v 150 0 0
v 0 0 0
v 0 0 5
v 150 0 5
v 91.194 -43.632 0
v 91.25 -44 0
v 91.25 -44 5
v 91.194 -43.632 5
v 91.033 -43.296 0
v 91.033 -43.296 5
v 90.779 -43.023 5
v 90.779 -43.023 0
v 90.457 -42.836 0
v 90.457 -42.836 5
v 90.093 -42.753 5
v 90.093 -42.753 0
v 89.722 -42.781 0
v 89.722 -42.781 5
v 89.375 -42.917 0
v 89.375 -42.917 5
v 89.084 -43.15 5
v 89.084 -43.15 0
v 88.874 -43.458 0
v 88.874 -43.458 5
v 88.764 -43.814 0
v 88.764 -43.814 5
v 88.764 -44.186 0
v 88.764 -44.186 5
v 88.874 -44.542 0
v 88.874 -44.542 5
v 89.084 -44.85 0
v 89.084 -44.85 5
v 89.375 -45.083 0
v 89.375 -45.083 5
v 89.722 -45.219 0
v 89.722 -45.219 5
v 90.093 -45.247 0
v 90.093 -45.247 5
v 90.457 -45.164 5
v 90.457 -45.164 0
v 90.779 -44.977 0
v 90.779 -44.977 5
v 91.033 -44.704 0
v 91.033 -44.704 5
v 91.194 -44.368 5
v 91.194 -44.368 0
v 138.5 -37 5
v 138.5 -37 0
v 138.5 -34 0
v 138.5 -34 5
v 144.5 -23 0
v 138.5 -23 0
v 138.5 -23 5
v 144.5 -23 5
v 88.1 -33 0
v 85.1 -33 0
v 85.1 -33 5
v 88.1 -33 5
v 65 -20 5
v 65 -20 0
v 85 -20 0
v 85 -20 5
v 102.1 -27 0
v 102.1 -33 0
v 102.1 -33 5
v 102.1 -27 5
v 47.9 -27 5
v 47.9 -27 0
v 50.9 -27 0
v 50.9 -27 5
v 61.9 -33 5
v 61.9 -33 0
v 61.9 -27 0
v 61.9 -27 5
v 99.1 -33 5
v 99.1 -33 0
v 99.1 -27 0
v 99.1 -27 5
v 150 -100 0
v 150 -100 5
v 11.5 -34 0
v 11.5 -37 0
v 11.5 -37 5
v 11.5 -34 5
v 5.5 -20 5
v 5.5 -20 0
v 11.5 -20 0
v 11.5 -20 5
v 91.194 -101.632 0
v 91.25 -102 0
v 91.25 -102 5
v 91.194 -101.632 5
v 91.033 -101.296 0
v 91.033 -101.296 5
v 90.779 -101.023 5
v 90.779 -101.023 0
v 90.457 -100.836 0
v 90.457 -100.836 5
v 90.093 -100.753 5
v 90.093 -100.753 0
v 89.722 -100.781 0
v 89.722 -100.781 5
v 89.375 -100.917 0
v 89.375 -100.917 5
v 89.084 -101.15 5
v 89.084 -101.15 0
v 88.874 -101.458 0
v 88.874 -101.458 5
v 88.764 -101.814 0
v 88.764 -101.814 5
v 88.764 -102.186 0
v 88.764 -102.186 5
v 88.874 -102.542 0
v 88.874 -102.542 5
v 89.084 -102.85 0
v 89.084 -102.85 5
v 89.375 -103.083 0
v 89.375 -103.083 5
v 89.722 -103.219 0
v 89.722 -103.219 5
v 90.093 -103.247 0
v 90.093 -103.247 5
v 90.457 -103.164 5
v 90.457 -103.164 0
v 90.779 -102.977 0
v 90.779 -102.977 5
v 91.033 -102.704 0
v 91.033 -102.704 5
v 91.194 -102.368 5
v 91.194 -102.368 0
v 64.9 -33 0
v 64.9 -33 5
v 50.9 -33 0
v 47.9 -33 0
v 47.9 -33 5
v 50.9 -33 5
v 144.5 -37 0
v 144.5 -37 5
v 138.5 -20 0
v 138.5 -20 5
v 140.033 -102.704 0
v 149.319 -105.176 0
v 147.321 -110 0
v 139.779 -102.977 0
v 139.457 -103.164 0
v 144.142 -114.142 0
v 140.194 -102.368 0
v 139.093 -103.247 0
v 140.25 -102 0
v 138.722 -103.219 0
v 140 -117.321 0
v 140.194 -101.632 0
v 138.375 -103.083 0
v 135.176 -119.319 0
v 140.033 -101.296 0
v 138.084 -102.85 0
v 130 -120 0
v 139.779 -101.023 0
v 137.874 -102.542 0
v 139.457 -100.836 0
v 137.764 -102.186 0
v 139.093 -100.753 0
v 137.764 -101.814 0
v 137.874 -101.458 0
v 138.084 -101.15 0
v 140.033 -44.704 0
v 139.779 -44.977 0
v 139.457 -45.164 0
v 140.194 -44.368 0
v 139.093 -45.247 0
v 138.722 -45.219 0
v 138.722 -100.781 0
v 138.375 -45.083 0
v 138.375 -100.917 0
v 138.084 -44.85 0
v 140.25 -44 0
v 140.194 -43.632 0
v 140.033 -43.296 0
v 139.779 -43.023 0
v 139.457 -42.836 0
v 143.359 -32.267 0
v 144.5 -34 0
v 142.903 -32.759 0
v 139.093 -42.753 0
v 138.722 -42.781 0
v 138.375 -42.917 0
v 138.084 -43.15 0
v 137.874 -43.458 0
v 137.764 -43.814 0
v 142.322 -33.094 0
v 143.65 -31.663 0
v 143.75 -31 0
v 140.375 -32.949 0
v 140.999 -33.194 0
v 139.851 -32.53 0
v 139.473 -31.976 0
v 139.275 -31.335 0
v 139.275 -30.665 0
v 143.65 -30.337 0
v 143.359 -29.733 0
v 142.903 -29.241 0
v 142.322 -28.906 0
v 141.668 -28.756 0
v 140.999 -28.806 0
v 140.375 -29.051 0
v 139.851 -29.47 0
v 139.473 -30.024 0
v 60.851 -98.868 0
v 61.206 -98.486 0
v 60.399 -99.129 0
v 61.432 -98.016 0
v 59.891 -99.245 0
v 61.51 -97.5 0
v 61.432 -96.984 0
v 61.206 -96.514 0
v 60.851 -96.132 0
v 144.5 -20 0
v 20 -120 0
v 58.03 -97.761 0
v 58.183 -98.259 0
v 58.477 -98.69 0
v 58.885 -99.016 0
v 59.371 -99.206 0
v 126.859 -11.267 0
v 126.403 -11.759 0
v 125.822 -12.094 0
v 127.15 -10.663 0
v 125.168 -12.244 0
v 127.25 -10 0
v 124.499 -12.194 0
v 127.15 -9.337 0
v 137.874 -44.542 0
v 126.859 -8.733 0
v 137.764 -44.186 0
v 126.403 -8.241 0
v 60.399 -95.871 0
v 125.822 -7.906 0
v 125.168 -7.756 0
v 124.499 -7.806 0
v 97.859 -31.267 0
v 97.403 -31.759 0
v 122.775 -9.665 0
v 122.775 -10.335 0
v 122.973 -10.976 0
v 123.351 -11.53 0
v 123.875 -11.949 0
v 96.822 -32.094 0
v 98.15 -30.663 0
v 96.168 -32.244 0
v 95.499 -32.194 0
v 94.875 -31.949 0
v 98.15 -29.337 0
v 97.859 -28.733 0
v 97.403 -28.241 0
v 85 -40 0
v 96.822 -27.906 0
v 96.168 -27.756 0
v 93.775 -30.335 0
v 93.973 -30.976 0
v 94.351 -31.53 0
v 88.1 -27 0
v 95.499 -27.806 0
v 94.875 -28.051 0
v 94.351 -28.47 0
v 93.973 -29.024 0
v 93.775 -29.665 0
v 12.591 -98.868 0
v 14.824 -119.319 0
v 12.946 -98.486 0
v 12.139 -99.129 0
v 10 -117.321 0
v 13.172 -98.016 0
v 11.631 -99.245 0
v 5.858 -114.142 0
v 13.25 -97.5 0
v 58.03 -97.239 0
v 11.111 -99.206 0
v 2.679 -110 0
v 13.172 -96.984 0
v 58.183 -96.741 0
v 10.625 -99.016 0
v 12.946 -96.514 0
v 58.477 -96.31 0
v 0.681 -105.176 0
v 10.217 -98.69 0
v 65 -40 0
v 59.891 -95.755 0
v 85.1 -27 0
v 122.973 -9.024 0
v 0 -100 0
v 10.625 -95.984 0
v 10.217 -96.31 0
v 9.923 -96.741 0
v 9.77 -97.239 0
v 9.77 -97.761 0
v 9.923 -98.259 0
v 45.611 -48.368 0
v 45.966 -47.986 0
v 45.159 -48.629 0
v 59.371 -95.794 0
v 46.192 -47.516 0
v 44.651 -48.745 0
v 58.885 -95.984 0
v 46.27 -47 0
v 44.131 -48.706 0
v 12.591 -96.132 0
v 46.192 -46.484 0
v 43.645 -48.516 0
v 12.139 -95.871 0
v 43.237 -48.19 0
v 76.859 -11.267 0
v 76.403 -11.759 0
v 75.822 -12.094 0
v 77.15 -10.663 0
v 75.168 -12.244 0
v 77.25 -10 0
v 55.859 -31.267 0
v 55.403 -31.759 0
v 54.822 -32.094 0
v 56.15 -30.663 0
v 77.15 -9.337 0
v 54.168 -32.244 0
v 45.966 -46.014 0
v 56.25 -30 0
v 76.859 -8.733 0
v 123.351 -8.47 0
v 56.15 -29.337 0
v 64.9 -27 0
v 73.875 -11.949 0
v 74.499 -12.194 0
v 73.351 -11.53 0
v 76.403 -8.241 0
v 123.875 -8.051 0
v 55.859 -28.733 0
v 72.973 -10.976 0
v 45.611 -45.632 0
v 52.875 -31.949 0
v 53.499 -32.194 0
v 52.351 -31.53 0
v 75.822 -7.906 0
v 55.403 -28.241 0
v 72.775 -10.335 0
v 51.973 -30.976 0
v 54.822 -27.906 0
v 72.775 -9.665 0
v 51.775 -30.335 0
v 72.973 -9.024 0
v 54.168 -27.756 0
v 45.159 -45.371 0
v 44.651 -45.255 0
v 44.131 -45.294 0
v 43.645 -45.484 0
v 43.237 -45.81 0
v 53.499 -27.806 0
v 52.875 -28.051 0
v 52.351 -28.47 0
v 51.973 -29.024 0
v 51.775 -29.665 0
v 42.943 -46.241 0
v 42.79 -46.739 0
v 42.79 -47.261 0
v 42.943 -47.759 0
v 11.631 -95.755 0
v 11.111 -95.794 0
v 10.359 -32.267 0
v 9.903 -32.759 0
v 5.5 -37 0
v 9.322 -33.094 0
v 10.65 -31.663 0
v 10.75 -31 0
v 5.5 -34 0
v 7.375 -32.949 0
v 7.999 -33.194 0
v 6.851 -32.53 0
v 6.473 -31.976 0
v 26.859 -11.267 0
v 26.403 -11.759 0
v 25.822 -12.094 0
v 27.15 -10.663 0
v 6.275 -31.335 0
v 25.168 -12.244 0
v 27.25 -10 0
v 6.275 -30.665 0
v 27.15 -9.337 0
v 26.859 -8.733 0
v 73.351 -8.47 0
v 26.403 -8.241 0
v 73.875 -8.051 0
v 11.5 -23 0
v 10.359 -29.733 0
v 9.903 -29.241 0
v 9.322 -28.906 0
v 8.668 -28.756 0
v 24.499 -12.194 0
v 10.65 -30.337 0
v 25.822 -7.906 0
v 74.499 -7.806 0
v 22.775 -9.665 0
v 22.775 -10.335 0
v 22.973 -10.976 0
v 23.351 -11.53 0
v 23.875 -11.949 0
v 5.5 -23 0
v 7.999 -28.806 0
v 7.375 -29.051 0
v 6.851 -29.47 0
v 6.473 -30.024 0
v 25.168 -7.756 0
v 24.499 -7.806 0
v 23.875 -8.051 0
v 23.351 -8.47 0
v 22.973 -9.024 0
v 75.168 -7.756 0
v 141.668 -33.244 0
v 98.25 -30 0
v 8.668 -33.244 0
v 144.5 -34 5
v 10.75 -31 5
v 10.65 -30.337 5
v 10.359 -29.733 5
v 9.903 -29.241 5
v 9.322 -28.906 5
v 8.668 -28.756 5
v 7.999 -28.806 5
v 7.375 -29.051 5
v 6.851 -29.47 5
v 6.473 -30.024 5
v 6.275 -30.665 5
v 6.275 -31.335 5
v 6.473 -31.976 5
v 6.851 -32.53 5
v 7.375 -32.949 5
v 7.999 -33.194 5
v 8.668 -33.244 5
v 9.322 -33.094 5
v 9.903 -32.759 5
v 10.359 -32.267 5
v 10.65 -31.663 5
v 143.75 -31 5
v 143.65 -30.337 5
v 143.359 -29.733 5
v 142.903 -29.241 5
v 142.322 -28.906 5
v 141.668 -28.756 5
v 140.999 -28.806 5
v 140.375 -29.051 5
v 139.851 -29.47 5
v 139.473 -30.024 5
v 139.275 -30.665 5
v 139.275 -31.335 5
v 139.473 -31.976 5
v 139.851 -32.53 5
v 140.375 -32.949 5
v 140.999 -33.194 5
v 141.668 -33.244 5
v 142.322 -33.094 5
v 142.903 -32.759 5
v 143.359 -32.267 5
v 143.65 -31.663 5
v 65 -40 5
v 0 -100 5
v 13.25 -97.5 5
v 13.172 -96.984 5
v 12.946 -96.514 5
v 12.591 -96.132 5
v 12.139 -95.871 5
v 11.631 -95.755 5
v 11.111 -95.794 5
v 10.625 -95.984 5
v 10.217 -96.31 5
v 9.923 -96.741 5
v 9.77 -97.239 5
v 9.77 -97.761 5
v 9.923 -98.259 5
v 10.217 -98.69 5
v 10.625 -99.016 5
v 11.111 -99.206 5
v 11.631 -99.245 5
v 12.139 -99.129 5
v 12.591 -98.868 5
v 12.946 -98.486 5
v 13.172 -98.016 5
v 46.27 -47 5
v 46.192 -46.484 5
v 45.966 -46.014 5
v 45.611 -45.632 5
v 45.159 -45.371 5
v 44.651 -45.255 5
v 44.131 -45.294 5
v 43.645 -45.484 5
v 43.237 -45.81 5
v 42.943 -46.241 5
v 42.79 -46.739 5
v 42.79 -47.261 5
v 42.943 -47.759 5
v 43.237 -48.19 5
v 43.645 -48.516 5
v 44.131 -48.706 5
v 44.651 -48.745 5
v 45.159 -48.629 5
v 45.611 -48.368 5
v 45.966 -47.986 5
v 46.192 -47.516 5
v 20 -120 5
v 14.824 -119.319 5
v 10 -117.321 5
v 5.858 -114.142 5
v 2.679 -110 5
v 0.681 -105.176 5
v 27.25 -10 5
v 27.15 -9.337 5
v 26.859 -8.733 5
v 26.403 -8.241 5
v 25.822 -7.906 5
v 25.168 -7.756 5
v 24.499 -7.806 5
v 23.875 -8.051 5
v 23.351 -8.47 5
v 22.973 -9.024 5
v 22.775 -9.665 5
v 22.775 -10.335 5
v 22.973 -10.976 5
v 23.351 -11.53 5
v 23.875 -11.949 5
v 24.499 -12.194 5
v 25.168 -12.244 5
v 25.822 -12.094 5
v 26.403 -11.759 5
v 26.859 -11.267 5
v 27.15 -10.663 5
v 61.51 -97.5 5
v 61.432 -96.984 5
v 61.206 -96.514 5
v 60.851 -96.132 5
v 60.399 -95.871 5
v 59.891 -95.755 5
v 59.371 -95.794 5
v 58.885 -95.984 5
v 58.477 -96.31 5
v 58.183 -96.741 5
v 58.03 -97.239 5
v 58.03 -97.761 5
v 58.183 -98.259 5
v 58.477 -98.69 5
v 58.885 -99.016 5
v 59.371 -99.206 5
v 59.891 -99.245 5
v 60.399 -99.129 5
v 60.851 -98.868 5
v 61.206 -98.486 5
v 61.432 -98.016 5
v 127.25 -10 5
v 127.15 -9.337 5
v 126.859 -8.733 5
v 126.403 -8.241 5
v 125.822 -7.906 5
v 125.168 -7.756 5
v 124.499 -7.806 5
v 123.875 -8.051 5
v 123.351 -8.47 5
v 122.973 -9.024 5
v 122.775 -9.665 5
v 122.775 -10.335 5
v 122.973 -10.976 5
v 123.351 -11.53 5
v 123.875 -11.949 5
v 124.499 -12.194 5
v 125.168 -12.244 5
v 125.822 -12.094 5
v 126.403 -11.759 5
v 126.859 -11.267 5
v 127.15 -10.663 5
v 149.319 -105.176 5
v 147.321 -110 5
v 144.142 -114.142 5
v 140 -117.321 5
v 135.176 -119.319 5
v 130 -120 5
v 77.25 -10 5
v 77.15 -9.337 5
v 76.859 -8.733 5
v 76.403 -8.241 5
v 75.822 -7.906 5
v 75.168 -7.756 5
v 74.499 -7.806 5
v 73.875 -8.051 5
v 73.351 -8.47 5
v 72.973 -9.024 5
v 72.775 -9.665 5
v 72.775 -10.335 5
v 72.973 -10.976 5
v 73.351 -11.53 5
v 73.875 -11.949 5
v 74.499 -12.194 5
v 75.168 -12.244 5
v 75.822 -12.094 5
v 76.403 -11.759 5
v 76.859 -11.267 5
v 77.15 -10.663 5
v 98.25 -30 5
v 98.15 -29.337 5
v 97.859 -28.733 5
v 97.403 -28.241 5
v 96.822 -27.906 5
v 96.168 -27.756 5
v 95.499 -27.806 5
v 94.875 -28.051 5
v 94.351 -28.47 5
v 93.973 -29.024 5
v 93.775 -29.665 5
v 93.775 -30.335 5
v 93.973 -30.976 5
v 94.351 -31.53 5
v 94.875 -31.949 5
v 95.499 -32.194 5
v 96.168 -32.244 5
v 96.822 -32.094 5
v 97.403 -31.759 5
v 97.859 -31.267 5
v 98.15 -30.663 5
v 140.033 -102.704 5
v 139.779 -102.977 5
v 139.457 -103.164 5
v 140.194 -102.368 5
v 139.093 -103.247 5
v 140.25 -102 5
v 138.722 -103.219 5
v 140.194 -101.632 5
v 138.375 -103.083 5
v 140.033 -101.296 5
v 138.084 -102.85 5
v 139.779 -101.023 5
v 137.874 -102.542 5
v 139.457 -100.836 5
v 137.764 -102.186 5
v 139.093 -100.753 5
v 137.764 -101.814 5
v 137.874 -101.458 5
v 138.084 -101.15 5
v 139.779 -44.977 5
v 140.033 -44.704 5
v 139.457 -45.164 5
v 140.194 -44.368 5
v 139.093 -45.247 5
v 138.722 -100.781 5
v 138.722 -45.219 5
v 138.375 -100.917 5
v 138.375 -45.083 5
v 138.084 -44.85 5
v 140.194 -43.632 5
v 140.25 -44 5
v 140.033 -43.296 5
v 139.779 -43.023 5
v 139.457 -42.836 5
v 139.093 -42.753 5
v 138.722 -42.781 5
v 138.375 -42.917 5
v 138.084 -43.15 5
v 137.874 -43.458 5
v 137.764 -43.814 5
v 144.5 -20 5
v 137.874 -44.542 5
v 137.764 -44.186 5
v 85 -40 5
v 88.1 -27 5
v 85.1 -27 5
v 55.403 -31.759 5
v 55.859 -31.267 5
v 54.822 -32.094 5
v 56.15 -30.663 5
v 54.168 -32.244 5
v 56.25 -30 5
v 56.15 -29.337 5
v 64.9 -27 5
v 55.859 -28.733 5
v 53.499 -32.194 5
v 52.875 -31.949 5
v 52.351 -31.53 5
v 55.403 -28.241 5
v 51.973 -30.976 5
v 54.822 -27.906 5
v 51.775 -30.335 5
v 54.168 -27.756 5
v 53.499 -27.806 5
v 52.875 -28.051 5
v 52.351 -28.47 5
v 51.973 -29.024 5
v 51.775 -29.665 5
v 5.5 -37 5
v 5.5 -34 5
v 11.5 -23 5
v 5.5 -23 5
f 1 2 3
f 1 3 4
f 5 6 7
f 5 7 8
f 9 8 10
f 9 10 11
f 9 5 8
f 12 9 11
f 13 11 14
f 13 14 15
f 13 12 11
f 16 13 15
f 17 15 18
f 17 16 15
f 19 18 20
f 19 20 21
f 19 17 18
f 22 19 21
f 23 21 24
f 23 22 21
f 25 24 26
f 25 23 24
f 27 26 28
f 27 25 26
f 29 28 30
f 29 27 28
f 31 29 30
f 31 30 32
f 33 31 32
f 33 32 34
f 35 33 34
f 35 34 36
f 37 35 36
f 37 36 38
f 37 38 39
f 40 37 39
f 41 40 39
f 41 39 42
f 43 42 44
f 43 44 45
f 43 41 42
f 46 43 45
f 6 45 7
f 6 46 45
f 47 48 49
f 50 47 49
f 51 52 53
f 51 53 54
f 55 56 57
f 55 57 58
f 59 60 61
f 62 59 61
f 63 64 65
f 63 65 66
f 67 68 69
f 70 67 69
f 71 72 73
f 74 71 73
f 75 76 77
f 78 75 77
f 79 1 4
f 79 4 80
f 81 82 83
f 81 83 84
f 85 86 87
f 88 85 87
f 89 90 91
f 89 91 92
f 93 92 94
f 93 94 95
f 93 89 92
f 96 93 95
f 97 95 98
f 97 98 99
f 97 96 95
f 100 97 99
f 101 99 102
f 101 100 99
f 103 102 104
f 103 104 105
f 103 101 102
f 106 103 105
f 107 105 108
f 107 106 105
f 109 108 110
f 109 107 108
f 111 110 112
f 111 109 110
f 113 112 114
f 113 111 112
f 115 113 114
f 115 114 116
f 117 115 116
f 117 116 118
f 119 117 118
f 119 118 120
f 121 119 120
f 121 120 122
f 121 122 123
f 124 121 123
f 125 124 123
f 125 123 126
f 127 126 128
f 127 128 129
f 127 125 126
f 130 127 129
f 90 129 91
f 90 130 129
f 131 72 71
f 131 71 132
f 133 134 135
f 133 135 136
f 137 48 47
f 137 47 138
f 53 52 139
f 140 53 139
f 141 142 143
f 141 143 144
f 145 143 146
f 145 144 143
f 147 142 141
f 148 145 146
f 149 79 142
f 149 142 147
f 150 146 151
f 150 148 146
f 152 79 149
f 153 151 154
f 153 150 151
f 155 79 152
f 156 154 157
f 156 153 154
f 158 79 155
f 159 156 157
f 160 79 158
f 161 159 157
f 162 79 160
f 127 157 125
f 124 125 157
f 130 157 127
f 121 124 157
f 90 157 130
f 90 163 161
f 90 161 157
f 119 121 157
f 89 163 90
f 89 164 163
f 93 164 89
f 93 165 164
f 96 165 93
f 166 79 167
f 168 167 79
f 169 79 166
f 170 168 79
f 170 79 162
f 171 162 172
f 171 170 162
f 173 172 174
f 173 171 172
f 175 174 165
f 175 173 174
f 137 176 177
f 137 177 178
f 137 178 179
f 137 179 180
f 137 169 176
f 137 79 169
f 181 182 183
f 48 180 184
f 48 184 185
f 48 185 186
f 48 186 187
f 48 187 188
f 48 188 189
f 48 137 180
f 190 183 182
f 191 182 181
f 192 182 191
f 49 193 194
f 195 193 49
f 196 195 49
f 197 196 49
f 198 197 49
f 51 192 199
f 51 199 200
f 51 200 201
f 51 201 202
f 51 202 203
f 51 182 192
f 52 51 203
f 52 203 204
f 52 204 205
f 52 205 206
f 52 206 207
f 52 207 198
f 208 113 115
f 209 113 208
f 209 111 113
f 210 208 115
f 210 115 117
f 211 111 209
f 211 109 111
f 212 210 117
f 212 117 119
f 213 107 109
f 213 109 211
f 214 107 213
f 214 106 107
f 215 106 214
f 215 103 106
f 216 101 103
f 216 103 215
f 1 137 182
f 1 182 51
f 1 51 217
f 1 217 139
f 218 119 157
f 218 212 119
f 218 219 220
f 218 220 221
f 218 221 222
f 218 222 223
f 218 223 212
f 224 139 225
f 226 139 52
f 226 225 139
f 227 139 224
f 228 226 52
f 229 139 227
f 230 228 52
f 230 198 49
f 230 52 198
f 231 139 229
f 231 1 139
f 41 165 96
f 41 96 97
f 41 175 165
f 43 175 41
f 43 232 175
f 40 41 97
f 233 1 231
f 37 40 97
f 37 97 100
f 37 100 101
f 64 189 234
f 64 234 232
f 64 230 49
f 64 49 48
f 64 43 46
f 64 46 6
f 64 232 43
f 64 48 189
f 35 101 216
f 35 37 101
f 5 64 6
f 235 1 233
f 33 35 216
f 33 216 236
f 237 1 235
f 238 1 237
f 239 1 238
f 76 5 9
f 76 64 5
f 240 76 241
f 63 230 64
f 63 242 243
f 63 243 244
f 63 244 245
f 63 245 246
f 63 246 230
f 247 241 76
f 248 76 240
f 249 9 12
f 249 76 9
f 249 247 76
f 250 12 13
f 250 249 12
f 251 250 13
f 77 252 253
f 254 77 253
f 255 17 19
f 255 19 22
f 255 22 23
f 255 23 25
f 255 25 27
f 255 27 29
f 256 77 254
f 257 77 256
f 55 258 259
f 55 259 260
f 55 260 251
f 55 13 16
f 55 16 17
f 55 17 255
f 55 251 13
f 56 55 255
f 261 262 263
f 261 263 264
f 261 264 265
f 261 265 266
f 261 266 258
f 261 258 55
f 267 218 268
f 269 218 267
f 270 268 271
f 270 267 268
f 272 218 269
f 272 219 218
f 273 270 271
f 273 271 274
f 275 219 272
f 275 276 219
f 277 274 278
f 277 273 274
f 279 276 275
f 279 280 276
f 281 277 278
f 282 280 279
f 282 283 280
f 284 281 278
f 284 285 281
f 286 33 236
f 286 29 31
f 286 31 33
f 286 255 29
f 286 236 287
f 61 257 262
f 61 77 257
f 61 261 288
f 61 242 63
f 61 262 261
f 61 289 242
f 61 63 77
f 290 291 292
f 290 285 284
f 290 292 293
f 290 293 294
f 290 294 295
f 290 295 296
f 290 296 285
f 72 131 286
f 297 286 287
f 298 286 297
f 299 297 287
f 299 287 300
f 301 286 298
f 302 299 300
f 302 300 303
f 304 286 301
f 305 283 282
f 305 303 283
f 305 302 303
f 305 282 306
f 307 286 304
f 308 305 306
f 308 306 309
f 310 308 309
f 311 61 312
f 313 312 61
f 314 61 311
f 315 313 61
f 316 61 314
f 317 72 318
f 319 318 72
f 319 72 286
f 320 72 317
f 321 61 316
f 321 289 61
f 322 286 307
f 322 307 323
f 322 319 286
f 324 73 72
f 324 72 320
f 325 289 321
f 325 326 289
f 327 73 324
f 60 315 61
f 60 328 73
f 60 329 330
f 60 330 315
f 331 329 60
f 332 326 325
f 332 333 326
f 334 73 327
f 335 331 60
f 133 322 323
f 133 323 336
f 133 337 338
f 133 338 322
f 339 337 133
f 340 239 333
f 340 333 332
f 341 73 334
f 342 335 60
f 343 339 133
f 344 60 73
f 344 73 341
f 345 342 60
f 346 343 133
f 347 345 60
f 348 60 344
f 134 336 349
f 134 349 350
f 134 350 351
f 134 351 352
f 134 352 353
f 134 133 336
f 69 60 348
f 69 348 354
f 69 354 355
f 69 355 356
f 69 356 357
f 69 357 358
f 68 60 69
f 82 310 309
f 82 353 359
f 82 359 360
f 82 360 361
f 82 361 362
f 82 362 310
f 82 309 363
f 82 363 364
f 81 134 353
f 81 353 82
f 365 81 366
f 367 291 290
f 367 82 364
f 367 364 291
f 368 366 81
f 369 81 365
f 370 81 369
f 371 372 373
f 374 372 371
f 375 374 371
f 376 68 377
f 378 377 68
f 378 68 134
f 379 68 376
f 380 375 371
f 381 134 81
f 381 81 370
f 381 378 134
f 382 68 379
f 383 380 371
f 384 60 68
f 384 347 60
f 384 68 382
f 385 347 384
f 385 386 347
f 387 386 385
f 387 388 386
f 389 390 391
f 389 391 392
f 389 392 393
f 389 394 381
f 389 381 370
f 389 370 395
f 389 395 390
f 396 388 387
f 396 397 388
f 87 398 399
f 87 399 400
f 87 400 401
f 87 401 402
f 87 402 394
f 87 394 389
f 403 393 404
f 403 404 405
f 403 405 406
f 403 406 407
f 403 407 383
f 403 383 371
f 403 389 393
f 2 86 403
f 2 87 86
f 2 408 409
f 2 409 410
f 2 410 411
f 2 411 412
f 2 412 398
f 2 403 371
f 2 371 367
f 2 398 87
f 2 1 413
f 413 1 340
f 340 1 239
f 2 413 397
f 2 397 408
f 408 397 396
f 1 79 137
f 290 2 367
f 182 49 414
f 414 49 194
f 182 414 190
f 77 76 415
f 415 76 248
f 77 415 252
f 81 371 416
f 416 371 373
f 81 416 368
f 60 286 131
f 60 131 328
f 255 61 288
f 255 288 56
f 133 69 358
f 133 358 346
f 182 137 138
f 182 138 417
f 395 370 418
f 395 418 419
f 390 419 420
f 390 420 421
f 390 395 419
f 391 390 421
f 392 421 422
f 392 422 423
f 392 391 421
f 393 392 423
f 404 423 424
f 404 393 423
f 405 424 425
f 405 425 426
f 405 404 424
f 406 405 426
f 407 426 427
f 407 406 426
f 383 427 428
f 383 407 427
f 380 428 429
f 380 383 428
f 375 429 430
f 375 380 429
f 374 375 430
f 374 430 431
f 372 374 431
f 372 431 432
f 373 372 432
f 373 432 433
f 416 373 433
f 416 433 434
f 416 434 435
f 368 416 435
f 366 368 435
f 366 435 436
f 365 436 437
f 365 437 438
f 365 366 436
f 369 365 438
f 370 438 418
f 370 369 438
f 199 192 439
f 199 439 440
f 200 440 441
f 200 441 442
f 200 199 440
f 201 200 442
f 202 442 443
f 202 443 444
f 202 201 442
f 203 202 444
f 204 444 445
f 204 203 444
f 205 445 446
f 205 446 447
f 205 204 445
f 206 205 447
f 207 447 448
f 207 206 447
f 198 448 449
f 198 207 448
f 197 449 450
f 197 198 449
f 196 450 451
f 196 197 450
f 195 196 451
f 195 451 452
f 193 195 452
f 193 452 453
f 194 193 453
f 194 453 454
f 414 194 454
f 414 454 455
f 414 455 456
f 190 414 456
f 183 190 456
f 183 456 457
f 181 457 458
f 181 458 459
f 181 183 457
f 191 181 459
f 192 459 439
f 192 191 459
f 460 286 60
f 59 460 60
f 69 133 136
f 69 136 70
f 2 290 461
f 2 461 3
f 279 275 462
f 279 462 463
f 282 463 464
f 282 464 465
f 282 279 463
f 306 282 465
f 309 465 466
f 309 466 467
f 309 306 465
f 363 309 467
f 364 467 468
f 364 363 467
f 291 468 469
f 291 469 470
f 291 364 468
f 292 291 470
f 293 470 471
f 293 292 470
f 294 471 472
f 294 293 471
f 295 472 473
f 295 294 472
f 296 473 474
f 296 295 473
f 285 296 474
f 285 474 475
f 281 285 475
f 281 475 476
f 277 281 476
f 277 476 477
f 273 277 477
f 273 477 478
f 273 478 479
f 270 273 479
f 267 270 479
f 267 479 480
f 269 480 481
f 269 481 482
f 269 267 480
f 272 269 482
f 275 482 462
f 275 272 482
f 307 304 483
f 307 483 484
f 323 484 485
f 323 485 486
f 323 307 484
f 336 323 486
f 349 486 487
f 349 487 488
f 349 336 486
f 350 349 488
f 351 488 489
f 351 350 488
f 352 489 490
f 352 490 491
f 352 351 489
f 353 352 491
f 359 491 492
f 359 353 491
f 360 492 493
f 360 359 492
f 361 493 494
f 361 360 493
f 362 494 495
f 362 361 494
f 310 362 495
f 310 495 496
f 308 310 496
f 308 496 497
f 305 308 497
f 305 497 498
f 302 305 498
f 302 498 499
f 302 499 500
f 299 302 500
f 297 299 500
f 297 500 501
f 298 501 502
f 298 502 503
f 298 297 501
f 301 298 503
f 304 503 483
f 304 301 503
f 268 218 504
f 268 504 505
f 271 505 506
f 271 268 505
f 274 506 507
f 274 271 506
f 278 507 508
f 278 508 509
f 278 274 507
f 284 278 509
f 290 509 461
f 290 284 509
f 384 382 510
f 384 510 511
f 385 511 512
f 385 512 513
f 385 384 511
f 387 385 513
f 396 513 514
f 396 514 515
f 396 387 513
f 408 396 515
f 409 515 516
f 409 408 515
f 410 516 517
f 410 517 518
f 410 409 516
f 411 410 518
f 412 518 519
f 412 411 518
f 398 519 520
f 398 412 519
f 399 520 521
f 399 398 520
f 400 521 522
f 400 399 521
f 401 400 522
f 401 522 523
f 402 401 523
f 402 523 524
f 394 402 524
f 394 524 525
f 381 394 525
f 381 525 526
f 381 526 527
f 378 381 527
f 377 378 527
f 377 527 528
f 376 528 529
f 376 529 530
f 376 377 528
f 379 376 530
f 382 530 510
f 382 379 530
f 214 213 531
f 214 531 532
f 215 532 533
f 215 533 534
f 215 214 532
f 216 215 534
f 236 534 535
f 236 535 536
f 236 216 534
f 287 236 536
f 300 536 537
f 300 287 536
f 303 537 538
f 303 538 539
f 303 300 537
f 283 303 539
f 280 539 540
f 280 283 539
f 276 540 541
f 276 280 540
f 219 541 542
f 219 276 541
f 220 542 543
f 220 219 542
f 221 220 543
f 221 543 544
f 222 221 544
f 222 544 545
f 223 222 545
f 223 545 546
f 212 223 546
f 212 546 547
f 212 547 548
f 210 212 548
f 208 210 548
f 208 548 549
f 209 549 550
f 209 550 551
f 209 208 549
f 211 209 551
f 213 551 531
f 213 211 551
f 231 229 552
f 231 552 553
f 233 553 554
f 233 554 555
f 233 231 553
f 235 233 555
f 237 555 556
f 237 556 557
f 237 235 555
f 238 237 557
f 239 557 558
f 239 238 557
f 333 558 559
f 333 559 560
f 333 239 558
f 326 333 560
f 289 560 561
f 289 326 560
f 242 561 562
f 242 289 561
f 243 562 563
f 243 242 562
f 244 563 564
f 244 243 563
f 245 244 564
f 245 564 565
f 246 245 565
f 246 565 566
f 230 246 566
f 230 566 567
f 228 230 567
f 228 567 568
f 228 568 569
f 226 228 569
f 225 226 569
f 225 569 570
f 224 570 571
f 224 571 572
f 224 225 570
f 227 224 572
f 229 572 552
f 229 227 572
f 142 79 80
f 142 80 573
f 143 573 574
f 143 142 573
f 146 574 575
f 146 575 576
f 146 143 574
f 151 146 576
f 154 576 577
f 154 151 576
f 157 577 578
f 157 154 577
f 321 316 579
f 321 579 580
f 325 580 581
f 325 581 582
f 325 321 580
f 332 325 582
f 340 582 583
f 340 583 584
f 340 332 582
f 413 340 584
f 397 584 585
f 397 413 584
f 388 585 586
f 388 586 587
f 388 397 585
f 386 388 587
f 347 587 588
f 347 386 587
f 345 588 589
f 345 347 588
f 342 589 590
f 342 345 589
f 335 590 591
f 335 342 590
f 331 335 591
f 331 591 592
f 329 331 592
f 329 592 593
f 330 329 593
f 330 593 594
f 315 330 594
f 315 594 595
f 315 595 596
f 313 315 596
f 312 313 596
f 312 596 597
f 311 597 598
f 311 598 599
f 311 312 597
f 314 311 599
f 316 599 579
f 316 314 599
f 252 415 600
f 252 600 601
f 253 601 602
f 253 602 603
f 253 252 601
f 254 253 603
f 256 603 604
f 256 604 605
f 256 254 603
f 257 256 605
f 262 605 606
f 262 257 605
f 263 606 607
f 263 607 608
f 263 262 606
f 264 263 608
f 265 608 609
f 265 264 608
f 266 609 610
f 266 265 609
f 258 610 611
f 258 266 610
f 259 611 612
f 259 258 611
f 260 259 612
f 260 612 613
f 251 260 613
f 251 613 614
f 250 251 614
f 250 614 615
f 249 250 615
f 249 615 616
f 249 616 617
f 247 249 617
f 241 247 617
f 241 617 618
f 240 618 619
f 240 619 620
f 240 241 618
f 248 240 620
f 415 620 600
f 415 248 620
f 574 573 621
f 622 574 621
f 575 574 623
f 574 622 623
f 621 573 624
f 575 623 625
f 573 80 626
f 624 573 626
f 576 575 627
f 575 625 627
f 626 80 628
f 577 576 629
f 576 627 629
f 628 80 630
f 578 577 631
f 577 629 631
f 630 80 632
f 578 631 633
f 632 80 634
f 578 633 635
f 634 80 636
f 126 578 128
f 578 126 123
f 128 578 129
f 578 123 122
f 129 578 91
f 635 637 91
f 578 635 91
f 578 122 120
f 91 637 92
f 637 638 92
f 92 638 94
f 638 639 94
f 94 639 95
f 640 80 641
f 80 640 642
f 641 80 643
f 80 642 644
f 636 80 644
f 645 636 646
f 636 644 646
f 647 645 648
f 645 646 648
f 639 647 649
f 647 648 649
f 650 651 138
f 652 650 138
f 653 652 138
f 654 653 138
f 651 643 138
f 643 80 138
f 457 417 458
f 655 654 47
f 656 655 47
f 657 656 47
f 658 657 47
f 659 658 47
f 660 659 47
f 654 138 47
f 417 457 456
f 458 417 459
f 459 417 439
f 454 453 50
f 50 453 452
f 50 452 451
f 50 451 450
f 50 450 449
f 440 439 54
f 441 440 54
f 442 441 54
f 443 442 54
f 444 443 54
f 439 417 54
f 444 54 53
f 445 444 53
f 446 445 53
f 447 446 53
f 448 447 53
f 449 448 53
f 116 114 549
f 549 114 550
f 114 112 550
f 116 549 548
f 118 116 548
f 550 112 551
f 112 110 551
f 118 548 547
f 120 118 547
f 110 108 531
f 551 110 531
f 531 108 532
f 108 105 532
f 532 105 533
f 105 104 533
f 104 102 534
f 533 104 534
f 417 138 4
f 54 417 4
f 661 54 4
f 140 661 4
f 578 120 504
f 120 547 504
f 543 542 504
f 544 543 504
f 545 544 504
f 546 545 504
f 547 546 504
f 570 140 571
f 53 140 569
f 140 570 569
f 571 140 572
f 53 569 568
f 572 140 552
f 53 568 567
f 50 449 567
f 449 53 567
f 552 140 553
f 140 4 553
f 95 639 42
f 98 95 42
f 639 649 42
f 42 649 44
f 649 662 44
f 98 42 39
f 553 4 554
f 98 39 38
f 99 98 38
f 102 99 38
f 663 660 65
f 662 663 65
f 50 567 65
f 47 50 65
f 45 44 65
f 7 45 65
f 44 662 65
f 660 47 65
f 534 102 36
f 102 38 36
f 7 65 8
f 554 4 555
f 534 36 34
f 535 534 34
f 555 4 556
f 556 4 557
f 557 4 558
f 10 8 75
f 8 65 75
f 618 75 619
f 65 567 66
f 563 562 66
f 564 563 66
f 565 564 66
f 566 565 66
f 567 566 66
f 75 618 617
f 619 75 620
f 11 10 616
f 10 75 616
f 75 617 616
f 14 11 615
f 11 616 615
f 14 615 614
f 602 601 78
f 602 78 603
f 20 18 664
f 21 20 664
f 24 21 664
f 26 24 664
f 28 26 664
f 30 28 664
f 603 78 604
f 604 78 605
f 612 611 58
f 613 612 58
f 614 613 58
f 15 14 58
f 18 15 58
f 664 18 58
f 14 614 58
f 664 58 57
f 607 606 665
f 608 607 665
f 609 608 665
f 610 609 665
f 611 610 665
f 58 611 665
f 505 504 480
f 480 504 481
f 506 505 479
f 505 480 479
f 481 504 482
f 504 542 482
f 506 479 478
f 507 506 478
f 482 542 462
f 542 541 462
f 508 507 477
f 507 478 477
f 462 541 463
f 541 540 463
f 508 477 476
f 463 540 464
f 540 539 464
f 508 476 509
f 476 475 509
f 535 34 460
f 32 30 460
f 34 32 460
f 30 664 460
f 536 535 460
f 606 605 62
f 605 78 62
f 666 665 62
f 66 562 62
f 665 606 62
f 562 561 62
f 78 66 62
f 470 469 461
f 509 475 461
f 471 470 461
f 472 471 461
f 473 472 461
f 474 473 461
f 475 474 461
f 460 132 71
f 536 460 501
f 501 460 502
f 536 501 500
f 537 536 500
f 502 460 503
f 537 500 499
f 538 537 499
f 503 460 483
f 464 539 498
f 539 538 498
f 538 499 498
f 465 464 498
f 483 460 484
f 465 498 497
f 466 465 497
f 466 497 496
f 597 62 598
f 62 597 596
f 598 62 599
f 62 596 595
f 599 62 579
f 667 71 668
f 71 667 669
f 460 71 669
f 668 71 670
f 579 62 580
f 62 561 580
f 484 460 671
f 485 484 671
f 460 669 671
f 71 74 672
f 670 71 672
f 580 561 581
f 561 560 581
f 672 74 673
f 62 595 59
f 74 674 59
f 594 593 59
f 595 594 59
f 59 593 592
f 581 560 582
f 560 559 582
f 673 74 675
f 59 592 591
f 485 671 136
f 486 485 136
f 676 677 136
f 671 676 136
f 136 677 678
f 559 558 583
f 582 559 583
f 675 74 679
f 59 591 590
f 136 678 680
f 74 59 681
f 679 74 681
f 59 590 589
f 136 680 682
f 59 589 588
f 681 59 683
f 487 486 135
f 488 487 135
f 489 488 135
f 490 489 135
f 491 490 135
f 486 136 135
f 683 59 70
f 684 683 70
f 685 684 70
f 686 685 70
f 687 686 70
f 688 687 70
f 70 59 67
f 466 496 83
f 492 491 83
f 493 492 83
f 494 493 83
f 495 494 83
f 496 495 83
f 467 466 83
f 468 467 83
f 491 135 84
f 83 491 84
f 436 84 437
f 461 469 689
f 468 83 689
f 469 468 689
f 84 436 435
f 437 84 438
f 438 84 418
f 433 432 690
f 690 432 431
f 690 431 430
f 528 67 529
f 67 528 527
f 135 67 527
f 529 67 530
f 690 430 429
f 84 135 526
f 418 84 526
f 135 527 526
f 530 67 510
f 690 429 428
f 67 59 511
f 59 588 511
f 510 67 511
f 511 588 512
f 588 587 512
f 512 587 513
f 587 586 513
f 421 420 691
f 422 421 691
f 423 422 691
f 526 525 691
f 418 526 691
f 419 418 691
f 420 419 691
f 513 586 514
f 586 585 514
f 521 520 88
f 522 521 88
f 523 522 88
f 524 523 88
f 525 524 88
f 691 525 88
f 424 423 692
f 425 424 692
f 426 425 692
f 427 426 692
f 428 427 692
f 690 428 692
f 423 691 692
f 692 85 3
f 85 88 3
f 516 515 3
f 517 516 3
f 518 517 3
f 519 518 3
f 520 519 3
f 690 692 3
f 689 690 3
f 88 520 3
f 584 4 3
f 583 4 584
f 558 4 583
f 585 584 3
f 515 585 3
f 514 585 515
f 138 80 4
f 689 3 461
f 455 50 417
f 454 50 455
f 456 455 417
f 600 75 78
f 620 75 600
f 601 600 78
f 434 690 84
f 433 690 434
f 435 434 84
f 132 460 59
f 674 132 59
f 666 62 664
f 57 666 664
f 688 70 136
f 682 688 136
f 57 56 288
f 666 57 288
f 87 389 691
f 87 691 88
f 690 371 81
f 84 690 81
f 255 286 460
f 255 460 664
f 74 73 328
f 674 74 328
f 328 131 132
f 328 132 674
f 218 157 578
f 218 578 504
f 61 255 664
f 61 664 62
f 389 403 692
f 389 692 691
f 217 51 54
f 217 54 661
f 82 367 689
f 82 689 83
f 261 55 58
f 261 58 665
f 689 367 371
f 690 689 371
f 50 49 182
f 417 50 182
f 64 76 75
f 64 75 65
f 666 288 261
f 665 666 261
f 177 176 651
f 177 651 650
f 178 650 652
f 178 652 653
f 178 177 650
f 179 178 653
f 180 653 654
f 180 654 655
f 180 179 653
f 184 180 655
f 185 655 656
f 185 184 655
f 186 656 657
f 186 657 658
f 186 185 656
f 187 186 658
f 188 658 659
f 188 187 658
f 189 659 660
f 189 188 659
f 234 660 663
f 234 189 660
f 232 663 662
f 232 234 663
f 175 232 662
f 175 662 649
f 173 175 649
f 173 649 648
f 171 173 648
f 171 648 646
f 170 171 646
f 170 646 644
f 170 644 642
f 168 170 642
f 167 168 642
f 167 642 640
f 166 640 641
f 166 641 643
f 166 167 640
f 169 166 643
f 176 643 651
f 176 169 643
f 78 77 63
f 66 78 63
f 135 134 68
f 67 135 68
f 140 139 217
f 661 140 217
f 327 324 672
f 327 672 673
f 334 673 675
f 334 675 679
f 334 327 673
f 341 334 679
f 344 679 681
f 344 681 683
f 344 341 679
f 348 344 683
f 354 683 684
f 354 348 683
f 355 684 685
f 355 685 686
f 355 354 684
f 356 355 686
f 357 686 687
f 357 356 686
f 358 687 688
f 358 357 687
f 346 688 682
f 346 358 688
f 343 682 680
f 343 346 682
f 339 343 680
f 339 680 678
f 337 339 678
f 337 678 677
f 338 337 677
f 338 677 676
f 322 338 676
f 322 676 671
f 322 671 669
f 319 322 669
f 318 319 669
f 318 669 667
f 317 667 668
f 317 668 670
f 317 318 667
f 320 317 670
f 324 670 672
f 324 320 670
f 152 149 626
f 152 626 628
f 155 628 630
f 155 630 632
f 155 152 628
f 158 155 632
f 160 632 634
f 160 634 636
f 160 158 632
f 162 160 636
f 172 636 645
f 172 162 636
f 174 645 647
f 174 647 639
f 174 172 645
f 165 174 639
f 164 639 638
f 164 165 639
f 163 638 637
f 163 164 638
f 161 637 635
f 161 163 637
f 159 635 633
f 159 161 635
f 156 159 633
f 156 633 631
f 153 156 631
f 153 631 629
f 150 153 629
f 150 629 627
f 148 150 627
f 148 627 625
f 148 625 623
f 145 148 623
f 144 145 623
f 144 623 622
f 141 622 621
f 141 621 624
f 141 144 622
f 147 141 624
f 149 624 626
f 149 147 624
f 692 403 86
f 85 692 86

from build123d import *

# Parameters (mm, degrees)
ESQUISSE1_R        = 1.25
ESQUISSE1_R_2      = 2.25
ESQUISSE1_R_3      = 1.75
ESQUISSE1_W        = 20
ESQUISSE1_H        = 20
ESQUISSE1_W_2      = 6
ESQUISSE1_H_2      = 3
ESQUISSE1_W_3      = 3
ESQUISSE1_H_3      = 6
BOSS_EXTRU_1_DEPTH = 5


with BuildPart() as part:
    # Esquisse1 → Boss.-Extru.1 (new body)
    with BuildSketch(Plane.XY):
        with BuildLine():
            Line((0, 0), (150, 0))
            Line((150, 0), (150, -100))
            ThreePointArc((150, -100), (144.142135624, -114.142135624), (130, -120))
            Line((130, -120), (20, -120))
            ThreePointArc((20, -120), (5.857864376, -114.142135624), (0, -100))
            Line((0, -100), (0, 0))
        make_face()
        with Locations((90, -44)):
            Circle(ESQUISSE1_R, mode=Mode.SUBTRACT)
        with Locations((139, -44)):
            Circle(ESQUISSE1_R, mode=Mode.SUBTRACT)
        with Locations((139, -102)):
            Circle(ESQUISSE1_R, mode=Mode.SUBTRACT)
        with Locations((90, -102)):
            Circle(ESQUISSE1_R, mode=Mode.SUBTRACT)
        with Locations((8.5, -31)):
            Circle(ESQUISSE1_R_2, mode=Mode.SUBTRACT)
        with Locations((141.5, -31)):
            Circle(ESQUISSE1_R_2, mode=Mode.SUBTRACT)
        with Locations((25, -10)):
            Circle(ESQUISSE1_R_2, mode=Mode.SUBTRACT)
        with Locations((125, -10)):
            Circle(ESQUISSE1_R_2, mode=Mode.SUBTRACT)
        with Locations((96, -30)):
            Circle(ESQUISSE1_R_2, mode=Mode.SUBTRACT)
        with Locations((54, -30)):
            Circle(ESQUISSE1_R_2, mode=Mode.SUBTRACT)
        with Locations((75, -10)):
            Circle(ESQUISSE1_R_2, mode=Mode.SUBTRACT)
        with Locations((11.5, -97.5)):
            Circle(ESQUISSE1_R_3, mode=Mode.SUBTRACT)
        with Locations((59.76, -97.5)):
            Circle(ESQUISSE1_R_3, mode=Mode.SUBTRACT)
        with Locations((44.52, -47)):
            Circle(ESQUISSE1_R_3, mode=Mode.SUBTRACT)
        with Locations((75, -30)):
            Rectangle(ESQUISSE1_W, ESQUISSE1_H, mode=Mode.SUBTRACT)
        with Locations((8.5, -35.5)):
            Rectangle(ESQUISSE1_W_2, ESQUISSE1_H_2, mode=Mode.SUBTRACT)
        with Locations((8.5, -21.5)):
            Rectangle(ESQUISSE1_W_2, ESQUISSE1_H_2, mode=Mode.SUBTRACT)
        with Locations((141.5, -35.5)):
            Rectangle(ESQUISSE1_W_2, ESQUISSE1_H_2, mode=Mode.SUBTRACT)
        with Locations((141.5, -21.5)):
            Rectangle(ESQUISSE1_W_2, ESQUISSE1_H_2, mode=Mode.SUBTRACT)
        with Locations((100.6, -30)):
            Rectangle(ESQUISSE1_W_3, ESQUISSE1_H_3, mode=Mode.SUBTRACT)
        with Locations((86.6, -30)):
            Rectangle(ESQUISSE1_W_3, ESQUISSE1_H_3, mode=Mode.SUBTRACT)
        with Locations((49.4, -30)):
            Rectangle(ESQUISSE1_W_3, ESQUISSE1_H_3, mode=Mode.SUBTRACT)
        with Locations((63.4, -30)):
            Rectangle(ESQUISSE1_W_3, ESQUISSE1_H_3, mode=Mode.SUBTRACT)
    extrude(amount=BOSS_EXTRU_1_DEPTH)


solid = part.part
